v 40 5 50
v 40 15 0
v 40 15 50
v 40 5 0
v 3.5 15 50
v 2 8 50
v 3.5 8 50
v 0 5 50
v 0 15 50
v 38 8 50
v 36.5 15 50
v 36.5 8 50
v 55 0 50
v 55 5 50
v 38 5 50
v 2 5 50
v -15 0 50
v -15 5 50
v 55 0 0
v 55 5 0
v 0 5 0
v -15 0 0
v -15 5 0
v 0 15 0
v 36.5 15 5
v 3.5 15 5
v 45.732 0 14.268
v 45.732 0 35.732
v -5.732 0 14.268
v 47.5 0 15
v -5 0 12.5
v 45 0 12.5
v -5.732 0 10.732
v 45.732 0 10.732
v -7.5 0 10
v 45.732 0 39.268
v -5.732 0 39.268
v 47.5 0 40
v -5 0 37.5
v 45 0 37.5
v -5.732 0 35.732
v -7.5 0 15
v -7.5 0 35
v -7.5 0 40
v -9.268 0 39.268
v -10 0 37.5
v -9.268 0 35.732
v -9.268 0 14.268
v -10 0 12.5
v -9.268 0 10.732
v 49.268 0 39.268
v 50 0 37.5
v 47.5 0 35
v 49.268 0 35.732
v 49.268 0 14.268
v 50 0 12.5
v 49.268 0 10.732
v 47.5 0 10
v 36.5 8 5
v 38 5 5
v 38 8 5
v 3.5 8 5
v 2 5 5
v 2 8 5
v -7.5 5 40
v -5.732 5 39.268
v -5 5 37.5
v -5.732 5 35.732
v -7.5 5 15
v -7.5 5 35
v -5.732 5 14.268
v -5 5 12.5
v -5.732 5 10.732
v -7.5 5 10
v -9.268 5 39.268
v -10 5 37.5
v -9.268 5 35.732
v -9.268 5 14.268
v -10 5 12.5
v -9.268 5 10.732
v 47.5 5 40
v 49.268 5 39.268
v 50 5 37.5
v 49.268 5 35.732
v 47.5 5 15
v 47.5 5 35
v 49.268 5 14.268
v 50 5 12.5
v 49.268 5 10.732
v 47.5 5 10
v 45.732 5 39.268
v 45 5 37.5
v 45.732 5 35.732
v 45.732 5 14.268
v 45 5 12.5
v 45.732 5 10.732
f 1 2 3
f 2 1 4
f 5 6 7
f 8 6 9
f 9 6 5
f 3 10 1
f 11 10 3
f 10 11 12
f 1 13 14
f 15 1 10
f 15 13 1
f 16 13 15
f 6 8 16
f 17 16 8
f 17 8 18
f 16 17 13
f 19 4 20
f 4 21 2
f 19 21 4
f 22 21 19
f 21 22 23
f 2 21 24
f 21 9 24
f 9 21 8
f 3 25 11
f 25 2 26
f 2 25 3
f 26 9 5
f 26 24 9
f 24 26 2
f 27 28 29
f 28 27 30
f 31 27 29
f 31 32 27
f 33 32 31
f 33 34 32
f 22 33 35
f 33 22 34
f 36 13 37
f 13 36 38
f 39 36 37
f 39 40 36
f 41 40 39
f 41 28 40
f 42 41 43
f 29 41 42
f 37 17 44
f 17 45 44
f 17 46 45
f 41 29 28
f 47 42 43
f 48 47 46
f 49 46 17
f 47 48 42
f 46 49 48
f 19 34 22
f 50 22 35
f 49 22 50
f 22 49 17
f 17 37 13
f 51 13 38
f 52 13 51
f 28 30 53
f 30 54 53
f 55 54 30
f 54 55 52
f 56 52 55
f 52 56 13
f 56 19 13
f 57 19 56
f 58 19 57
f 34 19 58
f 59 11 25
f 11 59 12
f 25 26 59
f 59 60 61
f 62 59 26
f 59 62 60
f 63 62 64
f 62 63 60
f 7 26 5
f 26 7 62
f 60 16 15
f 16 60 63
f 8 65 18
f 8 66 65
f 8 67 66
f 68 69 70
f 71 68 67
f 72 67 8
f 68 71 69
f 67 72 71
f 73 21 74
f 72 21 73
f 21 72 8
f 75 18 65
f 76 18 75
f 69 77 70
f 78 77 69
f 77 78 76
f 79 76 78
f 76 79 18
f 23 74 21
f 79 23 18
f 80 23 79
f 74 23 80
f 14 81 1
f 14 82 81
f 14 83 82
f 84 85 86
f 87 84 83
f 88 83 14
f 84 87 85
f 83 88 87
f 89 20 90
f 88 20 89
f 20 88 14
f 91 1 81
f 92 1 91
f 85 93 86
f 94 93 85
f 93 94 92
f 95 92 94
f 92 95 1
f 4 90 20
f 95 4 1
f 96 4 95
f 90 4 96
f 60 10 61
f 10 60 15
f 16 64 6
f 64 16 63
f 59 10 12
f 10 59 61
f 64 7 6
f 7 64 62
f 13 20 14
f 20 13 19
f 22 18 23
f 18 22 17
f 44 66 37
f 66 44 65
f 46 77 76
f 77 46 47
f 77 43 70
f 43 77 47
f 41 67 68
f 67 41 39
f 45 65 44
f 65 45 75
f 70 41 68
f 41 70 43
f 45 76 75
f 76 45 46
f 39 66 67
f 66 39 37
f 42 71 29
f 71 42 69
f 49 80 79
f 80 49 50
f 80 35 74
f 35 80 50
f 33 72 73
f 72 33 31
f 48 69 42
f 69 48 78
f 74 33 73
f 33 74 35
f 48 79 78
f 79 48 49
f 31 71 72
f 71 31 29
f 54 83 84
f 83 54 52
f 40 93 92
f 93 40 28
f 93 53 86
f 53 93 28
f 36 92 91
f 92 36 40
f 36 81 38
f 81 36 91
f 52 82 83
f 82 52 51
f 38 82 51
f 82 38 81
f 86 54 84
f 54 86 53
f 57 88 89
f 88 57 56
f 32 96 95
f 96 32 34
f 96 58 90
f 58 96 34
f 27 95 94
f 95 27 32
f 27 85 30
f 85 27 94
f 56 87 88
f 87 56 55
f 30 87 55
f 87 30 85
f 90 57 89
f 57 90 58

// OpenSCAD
TabW=15;
TabD=5;
TabLoc=0;
BoxH=50;
BoxW=40;
BoxD=15;
Offset=5;
HoleDia=5;
PSW=33;
PSFlangW=36;
PSFlangD=3;
Wall=5;

PSCenter=(BoxW-PSW)/2;
HoleL=TabD+Offset*2;
DT=TabW*2;
HalfTab=TabW/2;
TabWith=BoxW+DT;
FlangCenter=(BoxW-PSFlangW)/2;

difference()
{
  cube([BoxW,BoxD,BoxH]);
  translate([PSCenter,Wall,Wall]) cube([PSW,BoxD,BoxH+Offset]);
  translate([FlangCenter,Wall,Wall]) cube([PSFlangW,PSFlangD,BoxH+Offset]);
}
difference()
{
  translate([-TabW,TabLoc,0]) cube([TabWith,TabD,BoxH]);
  translate([-HalfTab,TabLoc-Offset,(BoxH/2)+(BoxH/4)]) rotate([0,90,90]) cylinder(h=HoleL,d=HoleDia);
  translate([-HalfTab,TabLoc-Offset,(BoxH/2)-(BoxH/4)]) rotate([0,90,90]) cylinder(h=HoleL,d=HoleDia);
  translate([BoxW+HalfTab,TabLoc-Offset,(BoxH/2)+(BoxH/4)]) rotate([0,90,90]) cylinder(h=HoleL,d=HoleDia);
  translate([BoxW+HalfTab,TabLoc-Offset,(BoxH/2)-(BoxH/4)]) rotate([0,90,90]) cylinder(h=HoleL,d=HoleDia);
}
